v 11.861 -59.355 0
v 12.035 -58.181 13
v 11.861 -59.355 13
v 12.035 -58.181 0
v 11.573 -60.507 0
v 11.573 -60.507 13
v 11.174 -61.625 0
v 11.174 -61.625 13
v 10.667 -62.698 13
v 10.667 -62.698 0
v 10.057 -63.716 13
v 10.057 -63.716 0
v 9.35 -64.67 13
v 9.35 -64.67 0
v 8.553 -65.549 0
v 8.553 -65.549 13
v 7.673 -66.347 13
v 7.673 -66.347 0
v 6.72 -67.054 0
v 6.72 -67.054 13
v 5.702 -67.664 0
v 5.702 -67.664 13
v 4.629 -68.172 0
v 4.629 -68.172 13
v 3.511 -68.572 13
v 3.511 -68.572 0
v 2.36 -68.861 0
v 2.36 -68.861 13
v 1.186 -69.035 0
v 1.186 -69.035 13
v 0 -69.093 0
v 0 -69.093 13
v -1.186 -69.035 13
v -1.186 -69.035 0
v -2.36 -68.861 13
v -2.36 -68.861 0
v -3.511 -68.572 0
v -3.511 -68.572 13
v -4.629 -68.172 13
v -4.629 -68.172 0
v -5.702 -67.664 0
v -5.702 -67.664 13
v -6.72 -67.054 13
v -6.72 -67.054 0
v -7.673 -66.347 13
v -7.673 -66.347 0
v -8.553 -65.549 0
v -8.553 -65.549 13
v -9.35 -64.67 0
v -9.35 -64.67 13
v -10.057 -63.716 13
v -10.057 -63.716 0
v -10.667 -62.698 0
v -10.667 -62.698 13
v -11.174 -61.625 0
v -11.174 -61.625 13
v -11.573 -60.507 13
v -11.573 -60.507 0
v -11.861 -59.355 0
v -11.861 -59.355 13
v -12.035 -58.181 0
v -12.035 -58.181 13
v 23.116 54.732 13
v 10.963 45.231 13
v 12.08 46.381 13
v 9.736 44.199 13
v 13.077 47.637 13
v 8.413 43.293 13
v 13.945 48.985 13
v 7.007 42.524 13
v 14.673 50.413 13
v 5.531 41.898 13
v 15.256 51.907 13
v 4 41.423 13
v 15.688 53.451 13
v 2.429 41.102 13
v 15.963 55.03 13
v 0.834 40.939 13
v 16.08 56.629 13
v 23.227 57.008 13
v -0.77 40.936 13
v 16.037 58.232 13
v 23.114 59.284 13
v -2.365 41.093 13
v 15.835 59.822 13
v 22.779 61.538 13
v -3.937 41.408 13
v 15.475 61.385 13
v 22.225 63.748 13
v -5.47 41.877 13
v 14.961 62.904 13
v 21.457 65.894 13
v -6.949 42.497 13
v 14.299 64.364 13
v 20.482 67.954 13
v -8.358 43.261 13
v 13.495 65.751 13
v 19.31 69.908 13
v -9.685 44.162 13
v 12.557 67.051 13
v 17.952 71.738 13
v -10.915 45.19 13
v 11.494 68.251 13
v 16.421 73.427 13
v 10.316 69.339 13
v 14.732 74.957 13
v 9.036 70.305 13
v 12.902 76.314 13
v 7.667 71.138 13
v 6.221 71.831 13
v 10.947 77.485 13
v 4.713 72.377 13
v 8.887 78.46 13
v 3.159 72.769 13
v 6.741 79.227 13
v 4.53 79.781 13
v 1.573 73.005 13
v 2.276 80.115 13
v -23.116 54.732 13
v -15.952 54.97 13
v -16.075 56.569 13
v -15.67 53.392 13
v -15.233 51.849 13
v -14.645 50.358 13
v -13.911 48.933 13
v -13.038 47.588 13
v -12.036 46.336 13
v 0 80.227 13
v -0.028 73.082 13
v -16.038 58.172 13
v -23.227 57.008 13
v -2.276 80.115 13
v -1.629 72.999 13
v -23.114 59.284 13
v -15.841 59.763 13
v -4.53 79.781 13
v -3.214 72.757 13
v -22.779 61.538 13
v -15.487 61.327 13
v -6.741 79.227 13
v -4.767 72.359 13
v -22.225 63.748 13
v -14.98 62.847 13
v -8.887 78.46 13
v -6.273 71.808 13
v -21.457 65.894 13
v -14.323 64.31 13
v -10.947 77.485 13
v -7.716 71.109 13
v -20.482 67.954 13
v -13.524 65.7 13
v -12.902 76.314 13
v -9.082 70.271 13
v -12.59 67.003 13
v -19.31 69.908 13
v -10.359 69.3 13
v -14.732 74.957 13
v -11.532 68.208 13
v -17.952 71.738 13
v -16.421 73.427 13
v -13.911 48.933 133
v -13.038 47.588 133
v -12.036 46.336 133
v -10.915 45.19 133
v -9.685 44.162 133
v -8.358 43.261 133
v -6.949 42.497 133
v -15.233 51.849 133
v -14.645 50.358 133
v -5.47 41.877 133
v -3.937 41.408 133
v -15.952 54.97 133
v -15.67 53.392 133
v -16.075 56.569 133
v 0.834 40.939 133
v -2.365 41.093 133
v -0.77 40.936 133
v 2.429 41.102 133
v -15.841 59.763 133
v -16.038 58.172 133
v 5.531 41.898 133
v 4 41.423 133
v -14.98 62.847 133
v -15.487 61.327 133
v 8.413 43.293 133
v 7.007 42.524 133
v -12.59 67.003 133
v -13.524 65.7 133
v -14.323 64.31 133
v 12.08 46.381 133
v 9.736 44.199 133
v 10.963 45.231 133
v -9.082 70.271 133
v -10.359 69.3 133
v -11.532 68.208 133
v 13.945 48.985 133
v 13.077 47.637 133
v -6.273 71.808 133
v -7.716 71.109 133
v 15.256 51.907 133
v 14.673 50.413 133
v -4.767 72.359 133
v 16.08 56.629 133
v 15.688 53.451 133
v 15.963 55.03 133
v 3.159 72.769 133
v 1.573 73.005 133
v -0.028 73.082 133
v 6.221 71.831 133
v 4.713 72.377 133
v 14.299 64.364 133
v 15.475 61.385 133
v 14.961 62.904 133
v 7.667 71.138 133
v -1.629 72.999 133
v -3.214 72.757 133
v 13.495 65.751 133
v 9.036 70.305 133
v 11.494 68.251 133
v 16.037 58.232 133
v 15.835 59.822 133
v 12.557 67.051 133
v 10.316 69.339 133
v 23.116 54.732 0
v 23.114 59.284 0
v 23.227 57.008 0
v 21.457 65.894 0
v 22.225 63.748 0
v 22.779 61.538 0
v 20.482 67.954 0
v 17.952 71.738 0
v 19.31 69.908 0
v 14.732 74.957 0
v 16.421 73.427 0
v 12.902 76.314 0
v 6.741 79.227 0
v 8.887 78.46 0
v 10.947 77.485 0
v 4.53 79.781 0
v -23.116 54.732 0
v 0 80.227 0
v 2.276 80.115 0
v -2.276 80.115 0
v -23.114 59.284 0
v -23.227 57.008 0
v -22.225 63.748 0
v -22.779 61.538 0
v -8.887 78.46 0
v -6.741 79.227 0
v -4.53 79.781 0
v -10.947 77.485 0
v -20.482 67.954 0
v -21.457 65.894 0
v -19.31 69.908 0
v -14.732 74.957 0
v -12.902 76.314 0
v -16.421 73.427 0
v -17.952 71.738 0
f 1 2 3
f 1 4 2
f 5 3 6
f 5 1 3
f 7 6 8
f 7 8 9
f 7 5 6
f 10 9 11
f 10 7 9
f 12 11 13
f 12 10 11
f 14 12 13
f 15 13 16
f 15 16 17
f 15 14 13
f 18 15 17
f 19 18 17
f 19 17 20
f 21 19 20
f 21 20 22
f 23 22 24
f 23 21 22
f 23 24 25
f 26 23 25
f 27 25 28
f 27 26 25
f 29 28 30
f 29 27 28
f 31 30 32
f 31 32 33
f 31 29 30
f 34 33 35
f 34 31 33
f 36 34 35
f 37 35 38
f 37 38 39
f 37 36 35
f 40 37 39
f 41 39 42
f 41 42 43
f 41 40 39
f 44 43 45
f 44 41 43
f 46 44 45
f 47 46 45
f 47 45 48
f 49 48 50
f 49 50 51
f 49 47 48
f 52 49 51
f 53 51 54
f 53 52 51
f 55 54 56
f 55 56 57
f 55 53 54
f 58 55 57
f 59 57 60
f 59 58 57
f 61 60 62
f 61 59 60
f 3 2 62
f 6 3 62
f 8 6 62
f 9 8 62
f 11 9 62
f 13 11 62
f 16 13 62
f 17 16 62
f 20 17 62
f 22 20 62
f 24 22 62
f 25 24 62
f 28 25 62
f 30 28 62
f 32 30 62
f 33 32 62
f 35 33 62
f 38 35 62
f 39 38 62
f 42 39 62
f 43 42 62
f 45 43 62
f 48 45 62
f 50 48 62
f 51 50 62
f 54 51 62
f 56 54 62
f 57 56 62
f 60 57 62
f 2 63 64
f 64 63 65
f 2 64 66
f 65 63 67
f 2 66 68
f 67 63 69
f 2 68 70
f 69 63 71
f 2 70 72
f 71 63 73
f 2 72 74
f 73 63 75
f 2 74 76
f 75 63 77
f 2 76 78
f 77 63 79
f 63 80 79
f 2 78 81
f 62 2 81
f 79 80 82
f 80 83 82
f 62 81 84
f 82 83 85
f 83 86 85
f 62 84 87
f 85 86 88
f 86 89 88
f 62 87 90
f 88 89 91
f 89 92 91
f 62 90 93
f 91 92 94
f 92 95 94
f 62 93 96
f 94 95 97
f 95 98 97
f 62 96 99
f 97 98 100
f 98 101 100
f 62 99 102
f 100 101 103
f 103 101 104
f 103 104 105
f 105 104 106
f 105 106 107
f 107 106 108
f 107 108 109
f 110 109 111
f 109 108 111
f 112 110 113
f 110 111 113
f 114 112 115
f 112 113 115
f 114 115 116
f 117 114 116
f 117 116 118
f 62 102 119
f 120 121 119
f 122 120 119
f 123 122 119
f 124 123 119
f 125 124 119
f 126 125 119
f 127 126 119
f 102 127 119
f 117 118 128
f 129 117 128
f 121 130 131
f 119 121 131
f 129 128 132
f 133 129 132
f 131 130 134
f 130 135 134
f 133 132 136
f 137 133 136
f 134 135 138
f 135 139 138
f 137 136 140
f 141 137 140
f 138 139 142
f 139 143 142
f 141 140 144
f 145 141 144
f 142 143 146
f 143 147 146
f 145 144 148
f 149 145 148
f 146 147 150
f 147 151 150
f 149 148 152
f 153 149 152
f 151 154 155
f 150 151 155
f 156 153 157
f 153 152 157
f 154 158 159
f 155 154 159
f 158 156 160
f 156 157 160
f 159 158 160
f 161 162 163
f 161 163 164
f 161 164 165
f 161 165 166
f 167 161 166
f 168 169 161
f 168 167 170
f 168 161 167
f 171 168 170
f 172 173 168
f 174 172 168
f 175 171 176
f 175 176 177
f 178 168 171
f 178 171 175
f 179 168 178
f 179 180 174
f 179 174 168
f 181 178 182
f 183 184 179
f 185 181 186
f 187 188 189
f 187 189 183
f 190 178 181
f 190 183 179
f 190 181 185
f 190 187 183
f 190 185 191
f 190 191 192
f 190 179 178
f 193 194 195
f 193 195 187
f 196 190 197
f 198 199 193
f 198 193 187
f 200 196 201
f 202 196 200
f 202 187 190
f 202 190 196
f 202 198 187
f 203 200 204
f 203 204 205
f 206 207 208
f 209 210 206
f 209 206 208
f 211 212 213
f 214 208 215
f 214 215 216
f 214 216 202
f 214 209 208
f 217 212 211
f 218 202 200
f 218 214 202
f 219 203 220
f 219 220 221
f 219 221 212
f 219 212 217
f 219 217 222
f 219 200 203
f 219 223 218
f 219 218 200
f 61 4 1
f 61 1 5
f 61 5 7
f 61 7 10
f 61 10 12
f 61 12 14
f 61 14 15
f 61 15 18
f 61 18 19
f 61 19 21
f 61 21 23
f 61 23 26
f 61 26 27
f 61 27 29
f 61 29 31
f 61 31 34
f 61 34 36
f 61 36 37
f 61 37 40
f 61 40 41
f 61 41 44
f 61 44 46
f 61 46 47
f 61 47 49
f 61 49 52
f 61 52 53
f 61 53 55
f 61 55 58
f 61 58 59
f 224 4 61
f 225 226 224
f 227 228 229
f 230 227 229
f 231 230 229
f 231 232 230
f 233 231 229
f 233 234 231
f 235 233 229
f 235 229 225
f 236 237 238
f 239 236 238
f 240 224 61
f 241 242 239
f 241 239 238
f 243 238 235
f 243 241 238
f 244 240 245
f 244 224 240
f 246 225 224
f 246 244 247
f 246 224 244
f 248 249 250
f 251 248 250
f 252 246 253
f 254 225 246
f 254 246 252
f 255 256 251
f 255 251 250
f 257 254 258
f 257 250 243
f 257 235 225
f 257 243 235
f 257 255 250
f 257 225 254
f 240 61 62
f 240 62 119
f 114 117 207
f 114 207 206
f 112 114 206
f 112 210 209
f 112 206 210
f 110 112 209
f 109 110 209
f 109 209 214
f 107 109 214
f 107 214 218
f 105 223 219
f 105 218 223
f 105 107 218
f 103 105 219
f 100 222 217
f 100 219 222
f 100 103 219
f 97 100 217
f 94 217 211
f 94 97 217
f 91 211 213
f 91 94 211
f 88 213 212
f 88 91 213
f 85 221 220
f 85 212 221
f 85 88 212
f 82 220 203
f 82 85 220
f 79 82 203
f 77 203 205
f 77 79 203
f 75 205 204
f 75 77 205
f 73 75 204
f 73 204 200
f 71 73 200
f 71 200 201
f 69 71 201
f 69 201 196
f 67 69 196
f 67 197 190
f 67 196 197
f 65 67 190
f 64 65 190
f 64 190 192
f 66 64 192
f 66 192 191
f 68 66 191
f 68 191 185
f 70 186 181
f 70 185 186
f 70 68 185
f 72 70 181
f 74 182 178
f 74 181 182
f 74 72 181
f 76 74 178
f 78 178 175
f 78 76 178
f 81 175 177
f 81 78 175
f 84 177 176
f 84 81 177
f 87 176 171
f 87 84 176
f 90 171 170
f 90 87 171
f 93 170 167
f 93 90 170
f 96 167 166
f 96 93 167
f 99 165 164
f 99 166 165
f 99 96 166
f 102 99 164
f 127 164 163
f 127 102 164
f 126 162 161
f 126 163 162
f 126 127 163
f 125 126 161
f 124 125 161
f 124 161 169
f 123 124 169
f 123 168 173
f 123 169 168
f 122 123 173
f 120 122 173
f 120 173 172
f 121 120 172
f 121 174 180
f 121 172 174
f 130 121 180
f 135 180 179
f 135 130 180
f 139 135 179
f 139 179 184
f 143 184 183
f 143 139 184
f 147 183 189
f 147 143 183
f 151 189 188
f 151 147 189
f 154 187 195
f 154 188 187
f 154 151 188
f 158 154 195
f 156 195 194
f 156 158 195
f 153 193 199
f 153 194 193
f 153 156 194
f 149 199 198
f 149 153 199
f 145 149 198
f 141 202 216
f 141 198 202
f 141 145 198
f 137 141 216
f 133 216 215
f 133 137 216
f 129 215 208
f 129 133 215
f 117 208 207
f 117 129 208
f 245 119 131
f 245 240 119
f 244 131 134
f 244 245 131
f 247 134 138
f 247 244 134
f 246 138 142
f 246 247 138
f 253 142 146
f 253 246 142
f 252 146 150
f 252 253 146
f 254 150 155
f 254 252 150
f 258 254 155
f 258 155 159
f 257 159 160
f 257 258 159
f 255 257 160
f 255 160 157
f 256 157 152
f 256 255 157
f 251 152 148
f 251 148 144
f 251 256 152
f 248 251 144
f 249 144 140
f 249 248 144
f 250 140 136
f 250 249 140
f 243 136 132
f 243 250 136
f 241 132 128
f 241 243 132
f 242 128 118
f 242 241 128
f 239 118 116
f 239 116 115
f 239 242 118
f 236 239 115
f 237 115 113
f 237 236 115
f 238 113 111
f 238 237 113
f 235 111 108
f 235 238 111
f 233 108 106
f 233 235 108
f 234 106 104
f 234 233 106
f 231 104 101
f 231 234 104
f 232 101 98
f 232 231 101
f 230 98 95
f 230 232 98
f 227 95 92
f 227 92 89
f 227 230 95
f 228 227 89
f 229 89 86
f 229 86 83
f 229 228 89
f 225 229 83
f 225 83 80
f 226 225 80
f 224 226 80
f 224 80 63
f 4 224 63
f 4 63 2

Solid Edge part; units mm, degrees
sketch "Sketch1" plane through (0, 0, 0) normal (0, 0, 1) x (1, 0, 0)
  line L0 (-12.0351, -58.1811) -> (-23.1158, 54.7315)
  line L1 (23.1158, 54.7315) -> (12.0351, -58.1811)
  arc A0 (12.0351, -58.1811) -> (-12.0351, -58.1811) centre (0, -57) cw
  arc A1 (-23.1158, 54.7315) -> (23.1158, 54.7315) centre (0, 57) cw
extrude "Protrusion1" add sketch "Sketch1" along normal blind 13
sketch "Sketch2" plane through (0, 5.5669, 13) normal (0, 0, 1) x (0.0977, 0.9952, 0)
  circle A0 centre (51.1872, 5.0232) radius 16.0822
extrude "ExtrudedProtrusion_3" add sketch "Sketch2" along normal blind 120
